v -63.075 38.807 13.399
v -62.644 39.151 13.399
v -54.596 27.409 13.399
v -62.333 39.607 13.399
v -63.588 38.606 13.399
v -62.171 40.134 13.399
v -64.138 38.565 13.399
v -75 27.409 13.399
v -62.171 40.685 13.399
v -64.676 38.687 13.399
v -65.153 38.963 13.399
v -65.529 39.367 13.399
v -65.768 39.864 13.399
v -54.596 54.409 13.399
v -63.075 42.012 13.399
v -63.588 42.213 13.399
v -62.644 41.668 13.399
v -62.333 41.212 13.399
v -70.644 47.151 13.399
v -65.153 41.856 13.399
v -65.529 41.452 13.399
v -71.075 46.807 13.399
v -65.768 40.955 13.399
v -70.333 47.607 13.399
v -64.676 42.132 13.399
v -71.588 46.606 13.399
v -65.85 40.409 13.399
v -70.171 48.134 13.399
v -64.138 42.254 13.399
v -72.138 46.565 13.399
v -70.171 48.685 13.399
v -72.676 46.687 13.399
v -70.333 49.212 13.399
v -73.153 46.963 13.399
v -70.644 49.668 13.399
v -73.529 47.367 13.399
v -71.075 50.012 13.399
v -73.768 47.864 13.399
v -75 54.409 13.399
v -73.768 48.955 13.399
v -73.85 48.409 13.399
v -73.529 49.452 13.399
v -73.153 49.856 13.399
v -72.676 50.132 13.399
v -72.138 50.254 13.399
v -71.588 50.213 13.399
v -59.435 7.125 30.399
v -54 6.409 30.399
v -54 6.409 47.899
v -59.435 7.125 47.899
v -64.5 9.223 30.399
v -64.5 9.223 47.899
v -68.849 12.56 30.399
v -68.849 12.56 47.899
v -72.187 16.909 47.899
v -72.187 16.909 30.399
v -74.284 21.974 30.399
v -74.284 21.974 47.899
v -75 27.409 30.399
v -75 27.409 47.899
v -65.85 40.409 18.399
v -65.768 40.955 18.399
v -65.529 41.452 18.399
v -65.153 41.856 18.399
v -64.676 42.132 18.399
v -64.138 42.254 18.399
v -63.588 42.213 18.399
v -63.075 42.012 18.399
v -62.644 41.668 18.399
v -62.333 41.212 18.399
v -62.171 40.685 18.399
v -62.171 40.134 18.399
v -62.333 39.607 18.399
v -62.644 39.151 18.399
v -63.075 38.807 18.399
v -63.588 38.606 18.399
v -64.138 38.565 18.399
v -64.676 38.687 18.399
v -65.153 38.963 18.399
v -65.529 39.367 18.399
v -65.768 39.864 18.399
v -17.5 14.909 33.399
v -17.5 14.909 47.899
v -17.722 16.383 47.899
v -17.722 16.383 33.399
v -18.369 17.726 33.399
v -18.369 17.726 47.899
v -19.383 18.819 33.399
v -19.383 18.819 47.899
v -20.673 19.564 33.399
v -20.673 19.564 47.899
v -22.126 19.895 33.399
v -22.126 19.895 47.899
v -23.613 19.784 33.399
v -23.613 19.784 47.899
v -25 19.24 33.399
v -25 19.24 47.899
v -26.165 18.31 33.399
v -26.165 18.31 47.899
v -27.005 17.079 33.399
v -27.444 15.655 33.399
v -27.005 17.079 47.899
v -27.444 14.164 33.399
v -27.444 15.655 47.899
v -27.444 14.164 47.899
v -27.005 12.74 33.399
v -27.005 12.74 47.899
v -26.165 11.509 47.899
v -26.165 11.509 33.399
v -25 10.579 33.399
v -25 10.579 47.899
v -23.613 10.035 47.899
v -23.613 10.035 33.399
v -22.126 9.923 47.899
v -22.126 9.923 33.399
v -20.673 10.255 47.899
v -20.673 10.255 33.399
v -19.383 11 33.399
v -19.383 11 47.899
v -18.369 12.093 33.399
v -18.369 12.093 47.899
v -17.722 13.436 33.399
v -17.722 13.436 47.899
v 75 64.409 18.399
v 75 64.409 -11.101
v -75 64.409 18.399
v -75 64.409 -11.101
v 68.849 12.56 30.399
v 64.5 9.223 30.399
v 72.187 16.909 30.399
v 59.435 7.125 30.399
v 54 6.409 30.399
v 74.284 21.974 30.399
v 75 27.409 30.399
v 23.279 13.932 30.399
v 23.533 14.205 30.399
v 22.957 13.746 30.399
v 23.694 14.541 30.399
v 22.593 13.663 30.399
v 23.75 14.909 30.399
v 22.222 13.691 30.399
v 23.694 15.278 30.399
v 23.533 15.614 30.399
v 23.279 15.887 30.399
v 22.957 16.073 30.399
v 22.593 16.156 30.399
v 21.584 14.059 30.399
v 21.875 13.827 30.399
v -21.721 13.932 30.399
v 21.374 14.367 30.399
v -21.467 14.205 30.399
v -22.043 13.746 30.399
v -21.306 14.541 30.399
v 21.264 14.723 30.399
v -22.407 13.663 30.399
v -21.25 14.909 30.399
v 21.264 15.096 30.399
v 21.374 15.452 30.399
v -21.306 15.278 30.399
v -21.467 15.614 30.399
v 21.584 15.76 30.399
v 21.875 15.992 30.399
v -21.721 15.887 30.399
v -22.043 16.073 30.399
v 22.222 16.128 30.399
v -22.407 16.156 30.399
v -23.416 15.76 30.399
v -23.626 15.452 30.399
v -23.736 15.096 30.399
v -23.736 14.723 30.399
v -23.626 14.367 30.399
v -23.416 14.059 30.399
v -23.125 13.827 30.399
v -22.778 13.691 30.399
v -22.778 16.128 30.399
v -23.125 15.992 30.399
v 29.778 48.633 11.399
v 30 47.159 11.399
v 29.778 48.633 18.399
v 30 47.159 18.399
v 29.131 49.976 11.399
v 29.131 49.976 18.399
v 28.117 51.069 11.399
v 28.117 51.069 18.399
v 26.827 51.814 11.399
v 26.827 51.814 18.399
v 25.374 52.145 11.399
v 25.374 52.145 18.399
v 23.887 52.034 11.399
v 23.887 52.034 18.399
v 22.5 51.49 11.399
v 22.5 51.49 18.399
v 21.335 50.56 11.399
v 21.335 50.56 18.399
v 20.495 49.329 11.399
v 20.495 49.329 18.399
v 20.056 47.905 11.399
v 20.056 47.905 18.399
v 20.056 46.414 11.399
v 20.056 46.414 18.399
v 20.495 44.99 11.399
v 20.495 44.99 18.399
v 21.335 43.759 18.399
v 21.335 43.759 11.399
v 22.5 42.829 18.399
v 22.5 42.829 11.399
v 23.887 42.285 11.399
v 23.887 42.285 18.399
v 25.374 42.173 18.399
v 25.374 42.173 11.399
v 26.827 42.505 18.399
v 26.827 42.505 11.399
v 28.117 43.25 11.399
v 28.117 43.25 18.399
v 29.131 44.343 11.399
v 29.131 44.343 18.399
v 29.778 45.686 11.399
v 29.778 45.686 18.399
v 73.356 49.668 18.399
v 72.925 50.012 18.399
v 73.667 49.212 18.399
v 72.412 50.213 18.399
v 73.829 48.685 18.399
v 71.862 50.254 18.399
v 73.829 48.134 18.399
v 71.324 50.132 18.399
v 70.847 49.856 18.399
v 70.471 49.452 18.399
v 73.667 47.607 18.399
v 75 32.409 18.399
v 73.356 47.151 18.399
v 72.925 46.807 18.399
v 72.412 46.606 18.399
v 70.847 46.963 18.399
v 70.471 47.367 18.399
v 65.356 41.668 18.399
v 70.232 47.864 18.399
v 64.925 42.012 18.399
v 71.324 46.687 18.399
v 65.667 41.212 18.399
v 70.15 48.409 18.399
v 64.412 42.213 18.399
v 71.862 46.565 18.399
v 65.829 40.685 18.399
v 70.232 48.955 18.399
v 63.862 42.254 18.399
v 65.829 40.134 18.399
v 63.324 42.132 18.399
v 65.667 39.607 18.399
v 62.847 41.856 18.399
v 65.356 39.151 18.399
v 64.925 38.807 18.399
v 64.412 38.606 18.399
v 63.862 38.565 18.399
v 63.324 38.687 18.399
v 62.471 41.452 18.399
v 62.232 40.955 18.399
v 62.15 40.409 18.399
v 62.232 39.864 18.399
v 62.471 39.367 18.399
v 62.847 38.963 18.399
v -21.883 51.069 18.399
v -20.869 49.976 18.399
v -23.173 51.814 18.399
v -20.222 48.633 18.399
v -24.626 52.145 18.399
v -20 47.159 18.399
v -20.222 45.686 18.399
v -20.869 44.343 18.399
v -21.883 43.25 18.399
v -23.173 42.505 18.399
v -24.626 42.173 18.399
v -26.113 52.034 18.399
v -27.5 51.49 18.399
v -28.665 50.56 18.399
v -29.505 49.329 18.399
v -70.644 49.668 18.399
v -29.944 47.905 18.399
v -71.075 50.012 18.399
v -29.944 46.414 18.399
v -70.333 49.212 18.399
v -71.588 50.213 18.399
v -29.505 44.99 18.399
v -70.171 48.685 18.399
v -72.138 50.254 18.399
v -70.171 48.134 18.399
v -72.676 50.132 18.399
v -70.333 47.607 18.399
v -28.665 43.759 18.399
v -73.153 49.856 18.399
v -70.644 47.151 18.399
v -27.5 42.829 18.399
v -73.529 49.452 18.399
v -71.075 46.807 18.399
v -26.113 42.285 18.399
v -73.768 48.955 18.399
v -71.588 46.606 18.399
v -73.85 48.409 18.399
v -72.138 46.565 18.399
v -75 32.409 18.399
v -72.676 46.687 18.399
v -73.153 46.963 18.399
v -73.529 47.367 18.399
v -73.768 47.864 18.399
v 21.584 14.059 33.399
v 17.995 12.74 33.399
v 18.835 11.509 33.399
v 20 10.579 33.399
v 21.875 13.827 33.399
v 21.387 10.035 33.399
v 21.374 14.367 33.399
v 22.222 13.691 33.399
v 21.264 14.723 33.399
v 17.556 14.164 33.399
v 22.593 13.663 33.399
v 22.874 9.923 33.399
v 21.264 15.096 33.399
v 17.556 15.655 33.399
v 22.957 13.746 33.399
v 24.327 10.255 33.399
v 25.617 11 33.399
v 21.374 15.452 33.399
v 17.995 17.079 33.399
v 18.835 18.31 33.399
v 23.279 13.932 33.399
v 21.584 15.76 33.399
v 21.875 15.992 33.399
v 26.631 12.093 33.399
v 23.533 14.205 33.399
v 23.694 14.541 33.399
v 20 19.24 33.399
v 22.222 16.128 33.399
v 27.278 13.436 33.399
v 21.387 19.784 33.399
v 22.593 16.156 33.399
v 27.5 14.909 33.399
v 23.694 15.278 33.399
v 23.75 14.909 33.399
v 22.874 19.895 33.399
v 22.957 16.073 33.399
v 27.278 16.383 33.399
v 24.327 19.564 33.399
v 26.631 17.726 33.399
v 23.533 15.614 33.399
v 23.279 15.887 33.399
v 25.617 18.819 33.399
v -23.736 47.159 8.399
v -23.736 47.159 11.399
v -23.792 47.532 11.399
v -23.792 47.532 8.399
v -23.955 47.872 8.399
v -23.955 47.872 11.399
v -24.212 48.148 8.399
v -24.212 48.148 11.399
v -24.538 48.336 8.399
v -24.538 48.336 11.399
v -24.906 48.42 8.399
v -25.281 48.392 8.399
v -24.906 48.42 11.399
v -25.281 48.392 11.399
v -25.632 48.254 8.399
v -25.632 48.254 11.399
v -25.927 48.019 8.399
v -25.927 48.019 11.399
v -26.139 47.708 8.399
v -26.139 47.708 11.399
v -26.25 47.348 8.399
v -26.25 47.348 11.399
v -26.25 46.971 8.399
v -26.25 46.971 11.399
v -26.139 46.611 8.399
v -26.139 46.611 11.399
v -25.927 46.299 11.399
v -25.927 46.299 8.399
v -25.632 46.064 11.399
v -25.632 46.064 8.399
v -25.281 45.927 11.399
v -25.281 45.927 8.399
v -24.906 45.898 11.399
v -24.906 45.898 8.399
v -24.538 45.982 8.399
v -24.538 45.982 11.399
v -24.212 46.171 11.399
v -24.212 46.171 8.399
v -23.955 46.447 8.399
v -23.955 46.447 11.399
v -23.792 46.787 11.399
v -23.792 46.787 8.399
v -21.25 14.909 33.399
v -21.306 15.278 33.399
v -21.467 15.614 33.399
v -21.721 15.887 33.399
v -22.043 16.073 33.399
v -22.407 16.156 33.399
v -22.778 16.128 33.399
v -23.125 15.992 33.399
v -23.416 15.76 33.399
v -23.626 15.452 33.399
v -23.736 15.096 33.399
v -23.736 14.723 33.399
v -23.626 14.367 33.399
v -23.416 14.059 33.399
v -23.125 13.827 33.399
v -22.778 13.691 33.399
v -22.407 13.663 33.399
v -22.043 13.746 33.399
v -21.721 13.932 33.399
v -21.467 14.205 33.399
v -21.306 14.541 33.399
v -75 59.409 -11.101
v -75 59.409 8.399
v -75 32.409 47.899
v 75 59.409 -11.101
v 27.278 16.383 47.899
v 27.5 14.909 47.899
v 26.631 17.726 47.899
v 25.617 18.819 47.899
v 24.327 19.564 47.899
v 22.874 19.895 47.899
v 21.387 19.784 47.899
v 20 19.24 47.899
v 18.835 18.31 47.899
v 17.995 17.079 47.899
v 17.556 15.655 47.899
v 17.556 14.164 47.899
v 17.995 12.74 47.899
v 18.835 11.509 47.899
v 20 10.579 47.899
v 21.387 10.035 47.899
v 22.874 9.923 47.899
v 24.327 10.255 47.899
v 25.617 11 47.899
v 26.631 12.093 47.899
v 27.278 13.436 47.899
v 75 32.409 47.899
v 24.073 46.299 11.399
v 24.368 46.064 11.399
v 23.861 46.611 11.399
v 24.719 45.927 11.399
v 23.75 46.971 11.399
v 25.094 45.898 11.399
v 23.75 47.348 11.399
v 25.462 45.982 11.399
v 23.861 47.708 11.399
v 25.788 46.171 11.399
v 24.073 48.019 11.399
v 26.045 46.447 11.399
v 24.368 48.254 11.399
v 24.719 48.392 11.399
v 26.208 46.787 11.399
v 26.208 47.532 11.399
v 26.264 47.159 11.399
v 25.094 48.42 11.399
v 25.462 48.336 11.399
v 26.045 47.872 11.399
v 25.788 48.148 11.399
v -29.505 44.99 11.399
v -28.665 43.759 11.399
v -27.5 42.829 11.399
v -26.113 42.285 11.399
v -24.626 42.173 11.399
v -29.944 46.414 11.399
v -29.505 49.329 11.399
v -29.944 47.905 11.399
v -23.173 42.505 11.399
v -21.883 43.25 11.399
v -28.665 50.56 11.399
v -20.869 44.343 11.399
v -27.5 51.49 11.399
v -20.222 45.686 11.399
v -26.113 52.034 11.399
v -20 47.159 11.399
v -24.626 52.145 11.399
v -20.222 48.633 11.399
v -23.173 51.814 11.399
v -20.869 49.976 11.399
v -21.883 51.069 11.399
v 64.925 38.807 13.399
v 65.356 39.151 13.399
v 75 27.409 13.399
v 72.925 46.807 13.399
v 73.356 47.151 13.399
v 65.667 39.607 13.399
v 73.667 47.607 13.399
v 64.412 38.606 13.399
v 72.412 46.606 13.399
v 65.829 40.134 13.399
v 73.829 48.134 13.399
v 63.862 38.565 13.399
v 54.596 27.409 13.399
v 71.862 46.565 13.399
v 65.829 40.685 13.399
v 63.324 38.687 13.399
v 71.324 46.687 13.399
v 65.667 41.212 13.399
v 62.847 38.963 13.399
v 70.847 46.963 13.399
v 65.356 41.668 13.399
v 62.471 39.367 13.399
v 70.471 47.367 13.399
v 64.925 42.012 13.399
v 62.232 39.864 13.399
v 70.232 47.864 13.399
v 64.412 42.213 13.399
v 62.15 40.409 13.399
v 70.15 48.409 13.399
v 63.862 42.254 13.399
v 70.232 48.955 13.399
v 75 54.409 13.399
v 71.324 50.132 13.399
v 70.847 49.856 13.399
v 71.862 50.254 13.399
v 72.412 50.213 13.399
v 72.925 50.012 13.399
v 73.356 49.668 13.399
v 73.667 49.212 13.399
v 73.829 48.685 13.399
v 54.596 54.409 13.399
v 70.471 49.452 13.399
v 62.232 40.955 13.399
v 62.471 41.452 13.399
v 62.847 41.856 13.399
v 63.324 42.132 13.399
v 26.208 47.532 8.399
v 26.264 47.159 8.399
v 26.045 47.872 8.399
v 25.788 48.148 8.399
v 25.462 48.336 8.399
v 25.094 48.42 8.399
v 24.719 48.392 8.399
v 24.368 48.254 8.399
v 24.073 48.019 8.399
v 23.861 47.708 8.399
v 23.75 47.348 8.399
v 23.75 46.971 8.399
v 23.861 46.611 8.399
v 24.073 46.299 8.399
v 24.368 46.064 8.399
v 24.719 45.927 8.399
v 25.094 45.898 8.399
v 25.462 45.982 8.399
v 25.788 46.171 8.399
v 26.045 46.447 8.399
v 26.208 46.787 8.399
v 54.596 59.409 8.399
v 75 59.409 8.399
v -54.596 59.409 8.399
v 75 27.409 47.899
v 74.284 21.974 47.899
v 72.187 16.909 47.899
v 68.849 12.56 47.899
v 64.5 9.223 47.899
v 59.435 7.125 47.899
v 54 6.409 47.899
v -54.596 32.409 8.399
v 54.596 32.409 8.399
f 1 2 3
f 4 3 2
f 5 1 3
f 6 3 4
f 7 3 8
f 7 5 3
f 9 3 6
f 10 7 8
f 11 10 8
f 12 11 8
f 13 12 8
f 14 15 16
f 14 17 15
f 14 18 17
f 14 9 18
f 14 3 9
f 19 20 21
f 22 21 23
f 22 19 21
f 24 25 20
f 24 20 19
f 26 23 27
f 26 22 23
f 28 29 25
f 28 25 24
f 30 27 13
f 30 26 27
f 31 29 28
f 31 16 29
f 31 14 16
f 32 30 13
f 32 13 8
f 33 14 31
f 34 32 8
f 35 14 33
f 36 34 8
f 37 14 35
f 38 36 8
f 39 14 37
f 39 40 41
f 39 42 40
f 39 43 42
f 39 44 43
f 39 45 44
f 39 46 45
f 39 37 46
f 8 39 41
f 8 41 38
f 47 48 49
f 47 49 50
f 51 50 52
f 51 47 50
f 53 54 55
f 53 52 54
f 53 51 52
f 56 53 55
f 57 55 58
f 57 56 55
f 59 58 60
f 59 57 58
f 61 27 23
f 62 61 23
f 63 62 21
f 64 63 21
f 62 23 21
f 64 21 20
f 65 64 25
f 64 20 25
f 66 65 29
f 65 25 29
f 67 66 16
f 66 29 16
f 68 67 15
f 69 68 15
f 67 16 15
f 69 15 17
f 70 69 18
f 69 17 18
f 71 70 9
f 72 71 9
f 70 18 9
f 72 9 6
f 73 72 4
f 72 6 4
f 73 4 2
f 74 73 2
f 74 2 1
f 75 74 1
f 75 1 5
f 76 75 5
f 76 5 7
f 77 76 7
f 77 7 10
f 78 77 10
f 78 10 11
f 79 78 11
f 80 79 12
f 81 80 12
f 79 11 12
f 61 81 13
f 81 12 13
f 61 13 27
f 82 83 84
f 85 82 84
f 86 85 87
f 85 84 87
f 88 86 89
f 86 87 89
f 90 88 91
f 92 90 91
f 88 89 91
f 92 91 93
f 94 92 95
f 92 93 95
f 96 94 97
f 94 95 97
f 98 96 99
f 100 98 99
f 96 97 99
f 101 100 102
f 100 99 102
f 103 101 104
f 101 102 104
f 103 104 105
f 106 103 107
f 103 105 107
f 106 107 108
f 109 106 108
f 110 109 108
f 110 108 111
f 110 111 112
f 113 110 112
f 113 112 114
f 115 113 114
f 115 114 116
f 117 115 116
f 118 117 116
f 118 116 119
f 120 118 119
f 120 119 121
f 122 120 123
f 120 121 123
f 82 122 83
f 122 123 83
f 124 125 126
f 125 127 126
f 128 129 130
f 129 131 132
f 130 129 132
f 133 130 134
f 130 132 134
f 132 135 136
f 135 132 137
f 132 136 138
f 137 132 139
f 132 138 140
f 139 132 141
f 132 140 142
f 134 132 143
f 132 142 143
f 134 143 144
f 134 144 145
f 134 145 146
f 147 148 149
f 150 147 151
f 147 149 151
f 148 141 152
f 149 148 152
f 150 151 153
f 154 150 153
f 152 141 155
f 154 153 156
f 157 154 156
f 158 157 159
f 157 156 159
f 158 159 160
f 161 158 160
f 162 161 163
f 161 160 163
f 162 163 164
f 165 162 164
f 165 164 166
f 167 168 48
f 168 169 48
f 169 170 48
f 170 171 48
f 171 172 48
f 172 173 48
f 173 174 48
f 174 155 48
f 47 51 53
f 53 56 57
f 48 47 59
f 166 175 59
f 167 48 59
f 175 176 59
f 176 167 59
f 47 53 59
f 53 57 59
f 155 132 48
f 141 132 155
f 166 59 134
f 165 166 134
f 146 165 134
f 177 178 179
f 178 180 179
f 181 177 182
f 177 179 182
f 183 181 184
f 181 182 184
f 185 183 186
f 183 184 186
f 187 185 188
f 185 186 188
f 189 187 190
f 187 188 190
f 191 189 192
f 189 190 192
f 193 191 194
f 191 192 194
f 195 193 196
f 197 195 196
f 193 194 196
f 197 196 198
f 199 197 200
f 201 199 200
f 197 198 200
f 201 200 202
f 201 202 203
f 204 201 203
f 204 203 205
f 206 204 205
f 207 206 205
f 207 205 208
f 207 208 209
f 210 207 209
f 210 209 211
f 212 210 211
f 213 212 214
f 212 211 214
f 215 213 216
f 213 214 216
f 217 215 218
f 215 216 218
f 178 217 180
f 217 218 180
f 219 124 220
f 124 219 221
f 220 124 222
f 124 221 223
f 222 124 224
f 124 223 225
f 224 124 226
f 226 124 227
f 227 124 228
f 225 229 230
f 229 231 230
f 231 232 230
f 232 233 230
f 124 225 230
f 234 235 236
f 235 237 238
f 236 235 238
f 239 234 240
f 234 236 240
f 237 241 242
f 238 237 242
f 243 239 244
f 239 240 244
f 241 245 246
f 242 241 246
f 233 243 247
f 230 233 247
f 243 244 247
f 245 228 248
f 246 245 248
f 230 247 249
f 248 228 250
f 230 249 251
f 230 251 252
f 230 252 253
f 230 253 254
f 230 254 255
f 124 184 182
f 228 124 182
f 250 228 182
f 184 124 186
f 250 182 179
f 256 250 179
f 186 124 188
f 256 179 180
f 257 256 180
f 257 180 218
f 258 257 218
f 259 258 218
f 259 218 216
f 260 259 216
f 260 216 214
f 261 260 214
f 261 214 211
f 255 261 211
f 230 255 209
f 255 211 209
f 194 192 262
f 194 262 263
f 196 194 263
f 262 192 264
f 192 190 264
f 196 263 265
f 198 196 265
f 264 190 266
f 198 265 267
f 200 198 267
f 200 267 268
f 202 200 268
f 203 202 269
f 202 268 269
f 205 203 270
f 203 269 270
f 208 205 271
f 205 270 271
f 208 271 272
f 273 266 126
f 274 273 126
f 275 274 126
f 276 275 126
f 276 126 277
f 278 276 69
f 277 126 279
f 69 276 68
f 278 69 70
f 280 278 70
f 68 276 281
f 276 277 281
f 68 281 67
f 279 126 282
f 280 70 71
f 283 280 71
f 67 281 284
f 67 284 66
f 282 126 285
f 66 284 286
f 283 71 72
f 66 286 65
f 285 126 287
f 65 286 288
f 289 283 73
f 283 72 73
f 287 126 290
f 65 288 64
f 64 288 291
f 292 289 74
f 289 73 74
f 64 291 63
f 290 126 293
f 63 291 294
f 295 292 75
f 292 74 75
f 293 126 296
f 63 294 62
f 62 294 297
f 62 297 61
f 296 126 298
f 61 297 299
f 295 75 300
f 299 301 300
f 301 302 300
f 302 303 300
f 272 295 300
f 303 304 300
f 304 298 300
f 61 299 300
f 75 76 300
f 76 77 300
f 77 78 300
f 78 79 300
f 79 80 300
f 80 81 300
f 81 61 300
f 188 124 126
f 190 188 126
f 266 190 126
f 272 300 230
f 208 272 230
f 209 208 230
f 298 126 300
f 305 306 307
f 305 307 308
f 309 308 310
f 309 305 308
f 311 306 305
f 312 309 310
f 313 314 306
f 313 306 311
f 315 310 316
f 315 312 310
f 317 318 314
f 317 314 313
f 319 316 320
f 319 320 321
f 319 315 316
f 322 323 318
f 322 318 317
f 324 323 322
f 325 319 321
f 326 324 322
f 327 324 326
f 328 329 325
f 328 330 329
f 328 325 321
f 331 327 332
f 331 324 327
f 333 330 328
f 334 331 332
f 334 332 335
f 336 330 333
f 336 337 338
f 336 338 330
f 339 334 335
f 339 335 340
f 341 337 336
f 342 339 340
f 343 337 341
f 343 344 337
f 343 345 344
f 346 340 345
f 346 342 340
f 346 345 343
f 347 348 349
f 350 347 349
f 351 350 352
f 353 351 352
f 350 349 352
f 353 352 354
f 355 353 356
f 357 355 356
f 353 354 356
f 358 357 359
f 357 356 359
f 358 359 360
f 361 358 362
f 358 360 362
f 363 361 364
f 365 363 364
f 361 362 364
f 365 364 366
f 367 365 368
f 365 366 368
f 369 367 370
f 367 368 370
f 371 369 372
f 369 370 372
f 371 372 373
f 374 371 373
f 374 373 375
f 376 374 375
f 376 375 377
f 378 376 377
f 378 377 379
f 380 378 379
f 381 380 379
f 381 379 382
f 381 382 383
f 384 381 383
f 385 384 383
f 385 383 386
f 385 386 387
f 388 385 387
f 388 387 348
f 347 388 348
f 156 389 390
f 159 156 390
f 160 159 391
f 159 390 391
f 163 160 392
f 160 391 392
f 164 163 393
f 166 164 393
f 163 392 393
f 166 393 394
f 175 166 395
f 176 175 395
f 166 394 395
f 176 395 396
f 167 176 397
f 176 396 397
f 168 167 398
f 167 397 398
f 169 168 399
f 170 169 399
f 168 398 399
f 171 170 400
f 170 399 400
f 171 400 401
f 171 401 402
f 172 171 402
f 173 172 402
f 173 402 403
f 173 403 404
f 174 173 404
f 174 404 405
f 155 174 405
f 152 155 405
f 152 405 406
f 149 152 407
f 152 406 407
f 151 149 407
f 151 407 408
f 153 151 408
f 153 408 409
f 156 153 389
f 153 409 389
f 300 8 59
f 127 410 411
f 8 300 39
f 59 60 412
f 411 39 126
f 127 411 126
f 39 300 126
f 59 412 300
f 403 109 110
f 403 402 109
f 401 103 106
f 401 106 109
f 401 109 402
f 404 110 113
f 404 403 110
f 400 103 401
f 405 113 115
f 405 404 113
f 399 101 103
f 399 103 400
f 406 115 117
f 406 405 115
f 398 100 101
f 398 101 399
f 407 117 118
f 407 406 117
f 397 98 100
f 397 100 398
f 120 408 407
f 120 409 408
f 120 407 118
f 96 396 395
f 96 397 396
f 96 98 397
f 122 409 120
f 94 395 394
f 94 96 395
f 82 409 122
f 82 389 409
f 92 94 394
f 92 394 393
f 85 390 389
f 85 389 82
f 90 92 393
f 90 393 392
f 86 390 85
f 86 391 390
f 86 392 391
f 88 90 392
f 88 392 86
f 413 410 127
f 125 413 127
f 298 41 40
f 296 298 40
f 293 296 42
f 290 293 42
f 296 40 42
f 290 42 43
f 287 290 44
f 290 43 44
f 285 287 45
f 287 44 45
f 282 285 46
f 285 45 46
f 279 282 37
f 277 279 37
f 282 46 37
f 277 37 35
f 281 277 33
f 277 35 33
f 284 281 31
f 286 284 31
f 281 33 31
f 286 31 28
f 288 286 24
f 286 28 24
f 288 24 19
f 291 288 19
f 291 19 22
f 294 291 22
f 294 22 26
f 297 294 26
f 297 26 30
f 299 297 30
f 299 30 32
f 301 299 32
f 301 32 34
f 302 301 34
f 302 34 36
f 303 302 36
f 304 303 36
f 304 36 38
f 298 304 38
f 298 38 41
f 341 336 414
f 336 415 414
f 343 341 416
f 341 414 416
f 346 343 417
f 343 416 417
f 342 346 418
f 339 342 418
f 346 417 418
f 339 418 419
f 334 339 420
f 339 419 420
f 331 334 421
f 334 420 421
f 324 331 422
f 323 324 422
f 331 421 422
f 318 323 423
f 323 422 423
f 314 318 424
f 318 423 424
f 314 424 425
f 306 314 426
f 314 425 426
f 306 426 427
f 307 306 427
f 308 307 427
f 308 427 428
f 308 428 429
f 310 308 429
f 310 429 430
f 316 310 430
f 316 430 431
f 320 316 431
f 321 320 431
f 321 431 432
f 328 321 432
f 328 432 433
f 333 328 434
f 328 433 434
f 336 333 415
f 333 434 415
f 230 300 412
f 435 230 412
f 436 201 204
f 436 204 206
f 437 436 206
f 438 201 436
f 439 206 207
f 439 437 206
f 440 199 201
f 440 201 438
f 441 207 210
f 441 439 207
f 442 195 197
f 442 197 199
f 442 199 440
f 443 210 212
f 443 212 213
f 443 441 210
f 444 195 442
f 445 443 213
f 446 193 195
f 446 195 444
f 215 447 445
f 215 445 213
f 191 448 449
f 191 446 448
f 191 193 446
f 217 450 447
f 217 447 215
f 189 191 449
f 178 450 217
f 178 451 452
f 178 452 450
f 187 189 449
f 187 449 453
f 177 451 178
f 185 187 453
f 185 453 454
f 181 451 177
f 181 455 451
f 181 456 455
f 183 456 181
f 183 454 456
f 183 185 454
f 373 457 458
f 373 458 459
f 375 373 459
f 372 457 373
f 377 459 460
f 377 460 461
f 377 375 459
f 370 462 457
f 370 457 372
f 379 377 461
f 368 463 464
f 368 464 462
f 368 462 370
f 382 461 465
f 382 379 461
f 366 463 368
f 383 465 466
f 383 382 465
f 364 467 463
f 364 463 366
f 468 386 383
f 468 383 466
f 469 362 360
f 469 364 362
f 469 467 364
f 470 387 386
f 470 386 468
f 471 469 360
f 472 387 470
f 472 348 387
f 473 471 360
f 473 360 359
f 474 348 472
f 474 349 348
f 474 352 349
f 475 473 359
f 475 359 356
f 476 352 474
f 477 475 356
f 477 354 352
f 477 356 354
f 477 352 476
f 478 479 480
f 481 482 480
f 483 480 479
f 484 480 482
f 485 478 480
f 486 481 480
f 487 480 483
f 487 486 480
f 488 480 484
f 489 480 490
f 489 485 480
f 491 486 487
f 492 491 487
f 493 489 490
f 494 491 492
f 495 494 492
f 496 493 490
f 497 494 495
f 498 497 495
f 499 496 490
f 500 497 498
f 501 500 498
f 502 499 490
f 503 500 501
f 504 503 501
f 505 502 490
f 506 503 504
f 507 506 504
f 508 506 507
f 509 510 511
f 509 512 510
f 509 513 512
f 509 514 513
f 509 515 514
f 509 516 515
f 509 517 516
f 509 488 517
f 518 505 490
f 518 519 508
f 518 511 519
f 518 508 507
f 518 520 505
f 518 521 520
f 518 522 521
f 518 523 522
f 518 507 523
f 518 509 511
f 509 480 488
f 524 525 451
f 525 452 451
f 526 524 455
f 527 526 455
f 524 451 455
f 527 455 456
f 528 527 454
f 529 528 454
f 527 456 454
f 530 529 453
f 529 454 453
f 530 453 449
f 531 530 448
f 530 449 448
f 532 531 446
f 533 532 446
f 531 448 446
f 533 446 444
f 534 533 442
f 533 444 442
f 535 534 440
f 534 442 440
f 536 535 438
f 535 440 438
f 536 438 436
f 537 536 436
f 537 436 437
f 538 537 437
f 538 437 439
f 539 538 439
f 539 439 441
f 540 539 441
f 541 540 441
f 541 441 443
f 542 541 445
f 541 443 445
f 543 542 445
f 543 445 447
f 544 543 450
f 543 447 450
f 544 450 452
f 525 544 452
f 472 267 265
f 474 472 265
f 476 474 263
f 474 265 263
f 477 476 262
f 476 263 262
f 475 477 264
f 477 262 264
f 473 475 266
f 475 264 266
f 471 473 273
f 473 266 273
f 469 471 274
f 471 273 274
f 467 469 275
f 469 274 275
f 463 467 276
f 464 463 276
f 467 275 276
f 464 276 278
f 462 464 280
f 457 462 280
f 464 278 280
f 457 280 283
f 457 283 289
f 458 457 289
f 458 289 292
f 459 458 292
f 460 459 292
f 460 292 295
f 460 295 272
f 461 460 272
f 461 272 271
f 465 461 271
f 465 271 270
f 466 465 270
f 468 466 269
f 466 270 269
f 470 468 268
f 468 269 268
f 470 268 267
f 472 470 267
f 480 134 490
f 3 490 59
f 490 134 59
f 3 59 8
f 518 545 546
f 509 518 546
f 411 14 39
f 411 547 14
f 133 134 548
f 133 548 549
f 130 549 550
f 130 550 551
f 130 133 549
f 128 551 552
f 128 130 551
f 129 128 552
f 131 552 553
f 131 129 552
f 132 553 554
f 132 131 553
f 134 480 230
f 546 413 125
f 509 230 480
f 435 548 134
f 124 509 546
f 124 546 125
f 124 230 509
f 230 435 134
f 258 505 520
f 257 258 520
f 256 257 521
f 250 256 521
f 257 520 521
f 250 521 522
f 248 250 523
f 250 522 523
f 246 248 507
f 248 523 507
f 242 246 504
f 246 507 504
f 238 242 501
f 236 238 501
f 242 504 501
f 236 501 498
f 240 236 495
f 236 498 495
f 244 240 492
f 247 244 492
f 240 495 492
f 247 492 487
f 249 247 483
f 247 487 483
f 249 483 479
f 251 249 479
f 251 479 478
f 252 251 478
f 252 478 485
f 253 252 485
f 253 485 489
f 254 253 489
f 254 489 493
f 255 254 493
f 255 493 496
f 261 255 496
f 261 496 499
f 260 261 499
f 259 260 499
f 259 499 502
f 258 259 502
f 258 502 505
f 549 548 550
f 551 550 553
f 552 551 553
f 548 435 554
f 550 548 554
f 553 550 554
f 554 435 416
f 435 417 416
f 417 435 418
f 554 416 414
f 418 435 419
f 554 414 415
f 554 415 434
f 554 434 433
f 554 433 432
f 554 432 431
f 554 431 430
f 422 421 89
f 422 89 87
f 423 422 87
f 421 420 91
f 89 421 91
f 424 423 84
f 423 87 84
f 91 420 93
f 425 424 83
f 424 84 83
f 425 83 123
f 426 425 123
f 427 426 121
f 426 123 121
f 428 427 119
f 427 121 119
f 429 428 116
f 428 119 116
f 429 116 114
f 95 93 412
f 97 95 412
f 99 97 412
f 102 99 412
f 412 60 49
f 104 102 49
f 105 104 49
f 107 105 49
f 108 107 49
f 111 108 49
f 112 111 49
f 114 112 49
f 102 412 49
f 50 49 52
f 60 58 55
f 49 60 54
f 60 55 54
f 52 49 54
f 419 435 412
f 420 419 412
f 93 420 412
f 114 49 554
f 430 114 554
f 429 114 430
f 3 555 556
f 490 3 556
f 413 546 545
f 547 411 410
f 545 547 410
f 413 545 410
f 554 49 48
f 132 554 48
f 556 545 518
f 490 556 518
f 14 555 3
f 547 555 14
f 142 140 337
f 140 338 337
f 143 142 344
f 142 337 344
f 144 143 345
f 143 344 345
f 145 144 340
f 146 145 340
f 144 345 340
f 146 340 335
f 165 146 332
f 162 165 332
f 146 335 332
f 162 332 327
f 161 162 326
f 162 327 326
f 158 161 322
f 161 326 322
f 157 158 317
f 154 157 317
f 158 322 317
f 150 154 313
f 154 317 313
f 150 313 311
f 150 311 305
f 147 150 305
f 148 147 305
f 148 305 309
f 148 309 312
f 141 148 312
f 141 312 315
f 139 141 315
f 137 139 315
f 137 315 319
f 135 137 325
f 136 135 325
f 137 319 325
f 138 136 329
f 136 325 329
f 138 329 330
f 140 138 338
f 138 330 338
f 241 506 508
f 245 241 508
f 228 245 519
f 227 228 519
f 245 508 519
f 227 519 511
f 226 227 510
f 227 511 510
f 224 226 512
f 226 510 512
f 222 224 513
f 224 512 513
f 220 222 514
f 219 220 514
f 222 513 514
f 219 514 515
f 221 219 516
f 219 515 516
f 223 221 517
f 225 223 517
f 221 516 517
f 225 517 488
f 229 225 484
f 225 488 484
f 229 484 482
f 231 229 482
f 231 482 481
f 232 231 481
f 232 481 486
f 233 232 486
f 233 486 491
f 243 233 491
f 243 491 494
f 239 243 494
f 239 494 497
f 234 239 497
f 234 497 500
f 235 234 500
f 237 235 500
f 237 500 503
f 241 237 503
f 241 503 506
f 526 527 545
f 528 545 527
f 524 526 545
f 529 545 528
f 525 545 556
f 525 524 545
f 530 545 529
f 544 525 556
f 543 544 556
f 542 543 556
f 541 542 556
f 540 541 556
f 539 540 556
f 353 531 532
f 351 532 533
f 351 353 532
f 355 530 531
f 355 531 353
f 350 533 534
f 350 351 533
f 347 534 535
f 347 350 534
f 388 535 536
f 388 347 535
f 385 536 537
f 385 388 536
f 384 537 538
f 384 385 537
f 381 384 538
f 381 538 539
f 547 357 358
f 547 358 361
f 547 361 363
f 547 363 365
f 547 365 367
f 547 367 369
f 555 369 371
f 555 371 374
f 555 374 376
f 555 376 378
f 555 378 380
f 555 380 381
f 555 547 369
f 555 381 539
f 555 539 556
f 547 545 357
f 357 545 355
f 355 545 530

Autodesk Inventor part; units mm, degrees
ref_plane "YZ Plane" through (0, 0, 0) normal (1, 0, 0) x (0, 1, 0)
ref_plane "XZ Plane" through (0, 0, 0) normal (0, 1, 0) x (-1, 0, 0)
ref_plane "XY Plane" through (0, 0, 0) normal (0, 0, 1) x (1, 0, 0)
sketch "Эскиз1" plane through (0, 0, 0) normal (0, 0, 1) x (1, 0, 0)
  point P0 (0, 0)
sketch "Эскиз2" plane through (0, 0, 0) normal (1, 0, 0) x (0, 1, 0)
  line L0 (54.4194, 8.3986) -> (39.8994, 8.3986)
  line L1 (59.4094, -4.1014) -> (59.4094, 3.8986)
  line L2 (64.4094, 15.8986) -> (64.4094, -11.1014)
  line L3 (61.9094, 18.3986) -> (34.9094, 18.3986)
  line L4 (32.4094, 20.8986) -> (32.4094, 47.8986)
  line L5 (23.4094, 30.3986) -> (6.4094, 30.3986)
  line L6 (27.4094, 14.7056) -> (27.4094, 16.0719)
  line L7 (59.4094, -11.1014) -> (64.4094, -11.1014)
  line L8 (64.4094, -11.1014) -> (64.4094, 18.3986)
  line L9 (64.4094, 18.3986) -> (59.4094, 18.3986)
  line L10 (59.4094, 18.3986) -> (59.4094, -11.1014)
  line L11 (32.4094, 8.3986) -> (59.4094, 8.3986)
  line L12 (59.4094, 8.3986) -> (59.4094, 18.3986)
  line L13 (59.4094, 18.3986) -> (32.4094, 18.3986)
  line L14 (32.4094, 18.3986) -> (32.4094, 8.3986)
  line L15 (27.4094, 8.3986) -> (32.4094, 8.3986)
  line L16 (32.4094, 8.3986) -> (32.4094, 47.8986)
  line L17 (32.4094, 47.8986) -> (27.4094, 47.8986)
  line L18 (27.4094, 47.8986) -> (27.4094, 8.3986)
  line L19 (6.4094, 30.3986) -> (27.4094, 30.3986)
  line L20 (27.4094, 30.3986) -> (27.4094, 47.8986)
  line L21 (27.4094, 47.8986) -> (6.4094, 47.8986)
  line L22 (6.4094, 47.8986) -> (6.4094, 30.3986)
  point P0 (0, 0)
  point P1 (59.4094, 8.3986)
  point P2 (61.9094, 18.3986)
  point P3 (34.9094, 18.3986)
  point P4 (32.4094, 8.3986)
  point P5 (27.4094, 8.3986)
extrude "Выдавливание1" add sketch "Эскиз2" along normal mid plane 150
sketch "Эскиз3" plane through (75, 59.4094, 8.3986) normal (0, 0, -1) x (-1, 0, 0)
  circle A0 centre (147, -11) radius 1.85 projected
  circle A1 centre (3, -11) radius 1.85 projected
  circle A2 centre (11, -19) radius 1.85 projected
  circle A3 centre (139, -19) radius 1.85 projected
  point P0 (75, -59.4094)
extrude "Выдавливание2" cut sketch "Эскиз3" against normal through all
sketch "Эскиз4" plane through (75, 59.4094, 8.3986) normal (0, 0, -1) x (-1, 0, 0)
  line L0 (150, 0) -> (150, -32) projected
  line L1 (150, 0) -> (0, 0) projected
  line L2 (150, -32) -> (129.5965, -32)
  line L3 (129.5965, -32) -> (129.5965, 0)
  line L4 (129.5965, 0) -> (150, 0)
  line L5 (150, 0) -> (150, -32)
  line L6 (150, -32) -> (0, -32) projected
  point P0 (75, -59.4094)
  point P1 (139.7982, -32)
extrude "Выдавливание3" cut sketch "Эскиз4" against normal blind 5
mirror "Зеркальное отражение1" about plane through (0, 0, 0) normal (1, 0, 0) of "Выдавливание3"
sketch "Эскиз5" plane through (-75, 6.4094, 47.8986) normal (0, 0, 1) x (1, 0, 0)
  circle A0 centre (97.5, 8.5) radius 1.25 projected
  circle A1 centre (52.5, 8.5) radius 1.25 projected
  circle A2 centre (100, 40.75) radius 1.2645 projected
  circle A3 centre (50, 40.75) radius 1.2645 projected
  point P0 (75, -6.4094)
extrude "Выдавливание4" cut sketch "Эскиз5" against normal through all
sketch "Эскиз6" plane through (-75, 6.4094, 47.8986) normal (0, 0, 1) x (1, 0, 0)
  circle A0 centre (97.5, 8.5) radius 1.25 projected
  circle A1 centre (97.5, 8.5) radius 5
  circle A2 centre (52.5, 8.5) radius 1.25 projected
  circle A3 centre (52.5, 8.5) radius 5
  point P0 (75, -6.4094)
  dimension "d8" = 10
  dimension "d9" = 10
extrude "Выдавливание5" cut sketch "Эскиз6" against normal blind 14.5 contours A0 | A1 | A2 | A3
sketch "Эскиз7" plane through (-75, 32.4094, 18.3986) normal (0, 0, 1) x (1, 0, 0)
  circle A0 centre (100, 14.75) radius 1.2645 projected
  circle A1 centre (100, 14.75) radius 5
  circle A2 centre (50, 14.75) radius 1.2645 projected
  circle A3 centre (50, 14.75) radius 5
  point P0 (75, -32.4094)
  dimension "d12" = 10
  dimension "d13" = 10
extrude "Выдавливание6" cut sketch "Эскиз7" against normal blind 7 contours A0 | A1 | A2 | A3
fillet "Сопряжение1" radius 21 2 edges at (75, 6.4094, 39.1486) (-75, 6.4094, 39.1486)
chamfer "Фаска1" distance 5 angle 45 2 edges at (64.7982, 59.4094, 13.3986) (-64.7982, 59.4094, 13.3986)
chamfer "Фаска2" distance 5 angle 45 1 edges at (0, 27.4094, 8.3986)
properties part number "000.001.010 - Realsense крепление"
